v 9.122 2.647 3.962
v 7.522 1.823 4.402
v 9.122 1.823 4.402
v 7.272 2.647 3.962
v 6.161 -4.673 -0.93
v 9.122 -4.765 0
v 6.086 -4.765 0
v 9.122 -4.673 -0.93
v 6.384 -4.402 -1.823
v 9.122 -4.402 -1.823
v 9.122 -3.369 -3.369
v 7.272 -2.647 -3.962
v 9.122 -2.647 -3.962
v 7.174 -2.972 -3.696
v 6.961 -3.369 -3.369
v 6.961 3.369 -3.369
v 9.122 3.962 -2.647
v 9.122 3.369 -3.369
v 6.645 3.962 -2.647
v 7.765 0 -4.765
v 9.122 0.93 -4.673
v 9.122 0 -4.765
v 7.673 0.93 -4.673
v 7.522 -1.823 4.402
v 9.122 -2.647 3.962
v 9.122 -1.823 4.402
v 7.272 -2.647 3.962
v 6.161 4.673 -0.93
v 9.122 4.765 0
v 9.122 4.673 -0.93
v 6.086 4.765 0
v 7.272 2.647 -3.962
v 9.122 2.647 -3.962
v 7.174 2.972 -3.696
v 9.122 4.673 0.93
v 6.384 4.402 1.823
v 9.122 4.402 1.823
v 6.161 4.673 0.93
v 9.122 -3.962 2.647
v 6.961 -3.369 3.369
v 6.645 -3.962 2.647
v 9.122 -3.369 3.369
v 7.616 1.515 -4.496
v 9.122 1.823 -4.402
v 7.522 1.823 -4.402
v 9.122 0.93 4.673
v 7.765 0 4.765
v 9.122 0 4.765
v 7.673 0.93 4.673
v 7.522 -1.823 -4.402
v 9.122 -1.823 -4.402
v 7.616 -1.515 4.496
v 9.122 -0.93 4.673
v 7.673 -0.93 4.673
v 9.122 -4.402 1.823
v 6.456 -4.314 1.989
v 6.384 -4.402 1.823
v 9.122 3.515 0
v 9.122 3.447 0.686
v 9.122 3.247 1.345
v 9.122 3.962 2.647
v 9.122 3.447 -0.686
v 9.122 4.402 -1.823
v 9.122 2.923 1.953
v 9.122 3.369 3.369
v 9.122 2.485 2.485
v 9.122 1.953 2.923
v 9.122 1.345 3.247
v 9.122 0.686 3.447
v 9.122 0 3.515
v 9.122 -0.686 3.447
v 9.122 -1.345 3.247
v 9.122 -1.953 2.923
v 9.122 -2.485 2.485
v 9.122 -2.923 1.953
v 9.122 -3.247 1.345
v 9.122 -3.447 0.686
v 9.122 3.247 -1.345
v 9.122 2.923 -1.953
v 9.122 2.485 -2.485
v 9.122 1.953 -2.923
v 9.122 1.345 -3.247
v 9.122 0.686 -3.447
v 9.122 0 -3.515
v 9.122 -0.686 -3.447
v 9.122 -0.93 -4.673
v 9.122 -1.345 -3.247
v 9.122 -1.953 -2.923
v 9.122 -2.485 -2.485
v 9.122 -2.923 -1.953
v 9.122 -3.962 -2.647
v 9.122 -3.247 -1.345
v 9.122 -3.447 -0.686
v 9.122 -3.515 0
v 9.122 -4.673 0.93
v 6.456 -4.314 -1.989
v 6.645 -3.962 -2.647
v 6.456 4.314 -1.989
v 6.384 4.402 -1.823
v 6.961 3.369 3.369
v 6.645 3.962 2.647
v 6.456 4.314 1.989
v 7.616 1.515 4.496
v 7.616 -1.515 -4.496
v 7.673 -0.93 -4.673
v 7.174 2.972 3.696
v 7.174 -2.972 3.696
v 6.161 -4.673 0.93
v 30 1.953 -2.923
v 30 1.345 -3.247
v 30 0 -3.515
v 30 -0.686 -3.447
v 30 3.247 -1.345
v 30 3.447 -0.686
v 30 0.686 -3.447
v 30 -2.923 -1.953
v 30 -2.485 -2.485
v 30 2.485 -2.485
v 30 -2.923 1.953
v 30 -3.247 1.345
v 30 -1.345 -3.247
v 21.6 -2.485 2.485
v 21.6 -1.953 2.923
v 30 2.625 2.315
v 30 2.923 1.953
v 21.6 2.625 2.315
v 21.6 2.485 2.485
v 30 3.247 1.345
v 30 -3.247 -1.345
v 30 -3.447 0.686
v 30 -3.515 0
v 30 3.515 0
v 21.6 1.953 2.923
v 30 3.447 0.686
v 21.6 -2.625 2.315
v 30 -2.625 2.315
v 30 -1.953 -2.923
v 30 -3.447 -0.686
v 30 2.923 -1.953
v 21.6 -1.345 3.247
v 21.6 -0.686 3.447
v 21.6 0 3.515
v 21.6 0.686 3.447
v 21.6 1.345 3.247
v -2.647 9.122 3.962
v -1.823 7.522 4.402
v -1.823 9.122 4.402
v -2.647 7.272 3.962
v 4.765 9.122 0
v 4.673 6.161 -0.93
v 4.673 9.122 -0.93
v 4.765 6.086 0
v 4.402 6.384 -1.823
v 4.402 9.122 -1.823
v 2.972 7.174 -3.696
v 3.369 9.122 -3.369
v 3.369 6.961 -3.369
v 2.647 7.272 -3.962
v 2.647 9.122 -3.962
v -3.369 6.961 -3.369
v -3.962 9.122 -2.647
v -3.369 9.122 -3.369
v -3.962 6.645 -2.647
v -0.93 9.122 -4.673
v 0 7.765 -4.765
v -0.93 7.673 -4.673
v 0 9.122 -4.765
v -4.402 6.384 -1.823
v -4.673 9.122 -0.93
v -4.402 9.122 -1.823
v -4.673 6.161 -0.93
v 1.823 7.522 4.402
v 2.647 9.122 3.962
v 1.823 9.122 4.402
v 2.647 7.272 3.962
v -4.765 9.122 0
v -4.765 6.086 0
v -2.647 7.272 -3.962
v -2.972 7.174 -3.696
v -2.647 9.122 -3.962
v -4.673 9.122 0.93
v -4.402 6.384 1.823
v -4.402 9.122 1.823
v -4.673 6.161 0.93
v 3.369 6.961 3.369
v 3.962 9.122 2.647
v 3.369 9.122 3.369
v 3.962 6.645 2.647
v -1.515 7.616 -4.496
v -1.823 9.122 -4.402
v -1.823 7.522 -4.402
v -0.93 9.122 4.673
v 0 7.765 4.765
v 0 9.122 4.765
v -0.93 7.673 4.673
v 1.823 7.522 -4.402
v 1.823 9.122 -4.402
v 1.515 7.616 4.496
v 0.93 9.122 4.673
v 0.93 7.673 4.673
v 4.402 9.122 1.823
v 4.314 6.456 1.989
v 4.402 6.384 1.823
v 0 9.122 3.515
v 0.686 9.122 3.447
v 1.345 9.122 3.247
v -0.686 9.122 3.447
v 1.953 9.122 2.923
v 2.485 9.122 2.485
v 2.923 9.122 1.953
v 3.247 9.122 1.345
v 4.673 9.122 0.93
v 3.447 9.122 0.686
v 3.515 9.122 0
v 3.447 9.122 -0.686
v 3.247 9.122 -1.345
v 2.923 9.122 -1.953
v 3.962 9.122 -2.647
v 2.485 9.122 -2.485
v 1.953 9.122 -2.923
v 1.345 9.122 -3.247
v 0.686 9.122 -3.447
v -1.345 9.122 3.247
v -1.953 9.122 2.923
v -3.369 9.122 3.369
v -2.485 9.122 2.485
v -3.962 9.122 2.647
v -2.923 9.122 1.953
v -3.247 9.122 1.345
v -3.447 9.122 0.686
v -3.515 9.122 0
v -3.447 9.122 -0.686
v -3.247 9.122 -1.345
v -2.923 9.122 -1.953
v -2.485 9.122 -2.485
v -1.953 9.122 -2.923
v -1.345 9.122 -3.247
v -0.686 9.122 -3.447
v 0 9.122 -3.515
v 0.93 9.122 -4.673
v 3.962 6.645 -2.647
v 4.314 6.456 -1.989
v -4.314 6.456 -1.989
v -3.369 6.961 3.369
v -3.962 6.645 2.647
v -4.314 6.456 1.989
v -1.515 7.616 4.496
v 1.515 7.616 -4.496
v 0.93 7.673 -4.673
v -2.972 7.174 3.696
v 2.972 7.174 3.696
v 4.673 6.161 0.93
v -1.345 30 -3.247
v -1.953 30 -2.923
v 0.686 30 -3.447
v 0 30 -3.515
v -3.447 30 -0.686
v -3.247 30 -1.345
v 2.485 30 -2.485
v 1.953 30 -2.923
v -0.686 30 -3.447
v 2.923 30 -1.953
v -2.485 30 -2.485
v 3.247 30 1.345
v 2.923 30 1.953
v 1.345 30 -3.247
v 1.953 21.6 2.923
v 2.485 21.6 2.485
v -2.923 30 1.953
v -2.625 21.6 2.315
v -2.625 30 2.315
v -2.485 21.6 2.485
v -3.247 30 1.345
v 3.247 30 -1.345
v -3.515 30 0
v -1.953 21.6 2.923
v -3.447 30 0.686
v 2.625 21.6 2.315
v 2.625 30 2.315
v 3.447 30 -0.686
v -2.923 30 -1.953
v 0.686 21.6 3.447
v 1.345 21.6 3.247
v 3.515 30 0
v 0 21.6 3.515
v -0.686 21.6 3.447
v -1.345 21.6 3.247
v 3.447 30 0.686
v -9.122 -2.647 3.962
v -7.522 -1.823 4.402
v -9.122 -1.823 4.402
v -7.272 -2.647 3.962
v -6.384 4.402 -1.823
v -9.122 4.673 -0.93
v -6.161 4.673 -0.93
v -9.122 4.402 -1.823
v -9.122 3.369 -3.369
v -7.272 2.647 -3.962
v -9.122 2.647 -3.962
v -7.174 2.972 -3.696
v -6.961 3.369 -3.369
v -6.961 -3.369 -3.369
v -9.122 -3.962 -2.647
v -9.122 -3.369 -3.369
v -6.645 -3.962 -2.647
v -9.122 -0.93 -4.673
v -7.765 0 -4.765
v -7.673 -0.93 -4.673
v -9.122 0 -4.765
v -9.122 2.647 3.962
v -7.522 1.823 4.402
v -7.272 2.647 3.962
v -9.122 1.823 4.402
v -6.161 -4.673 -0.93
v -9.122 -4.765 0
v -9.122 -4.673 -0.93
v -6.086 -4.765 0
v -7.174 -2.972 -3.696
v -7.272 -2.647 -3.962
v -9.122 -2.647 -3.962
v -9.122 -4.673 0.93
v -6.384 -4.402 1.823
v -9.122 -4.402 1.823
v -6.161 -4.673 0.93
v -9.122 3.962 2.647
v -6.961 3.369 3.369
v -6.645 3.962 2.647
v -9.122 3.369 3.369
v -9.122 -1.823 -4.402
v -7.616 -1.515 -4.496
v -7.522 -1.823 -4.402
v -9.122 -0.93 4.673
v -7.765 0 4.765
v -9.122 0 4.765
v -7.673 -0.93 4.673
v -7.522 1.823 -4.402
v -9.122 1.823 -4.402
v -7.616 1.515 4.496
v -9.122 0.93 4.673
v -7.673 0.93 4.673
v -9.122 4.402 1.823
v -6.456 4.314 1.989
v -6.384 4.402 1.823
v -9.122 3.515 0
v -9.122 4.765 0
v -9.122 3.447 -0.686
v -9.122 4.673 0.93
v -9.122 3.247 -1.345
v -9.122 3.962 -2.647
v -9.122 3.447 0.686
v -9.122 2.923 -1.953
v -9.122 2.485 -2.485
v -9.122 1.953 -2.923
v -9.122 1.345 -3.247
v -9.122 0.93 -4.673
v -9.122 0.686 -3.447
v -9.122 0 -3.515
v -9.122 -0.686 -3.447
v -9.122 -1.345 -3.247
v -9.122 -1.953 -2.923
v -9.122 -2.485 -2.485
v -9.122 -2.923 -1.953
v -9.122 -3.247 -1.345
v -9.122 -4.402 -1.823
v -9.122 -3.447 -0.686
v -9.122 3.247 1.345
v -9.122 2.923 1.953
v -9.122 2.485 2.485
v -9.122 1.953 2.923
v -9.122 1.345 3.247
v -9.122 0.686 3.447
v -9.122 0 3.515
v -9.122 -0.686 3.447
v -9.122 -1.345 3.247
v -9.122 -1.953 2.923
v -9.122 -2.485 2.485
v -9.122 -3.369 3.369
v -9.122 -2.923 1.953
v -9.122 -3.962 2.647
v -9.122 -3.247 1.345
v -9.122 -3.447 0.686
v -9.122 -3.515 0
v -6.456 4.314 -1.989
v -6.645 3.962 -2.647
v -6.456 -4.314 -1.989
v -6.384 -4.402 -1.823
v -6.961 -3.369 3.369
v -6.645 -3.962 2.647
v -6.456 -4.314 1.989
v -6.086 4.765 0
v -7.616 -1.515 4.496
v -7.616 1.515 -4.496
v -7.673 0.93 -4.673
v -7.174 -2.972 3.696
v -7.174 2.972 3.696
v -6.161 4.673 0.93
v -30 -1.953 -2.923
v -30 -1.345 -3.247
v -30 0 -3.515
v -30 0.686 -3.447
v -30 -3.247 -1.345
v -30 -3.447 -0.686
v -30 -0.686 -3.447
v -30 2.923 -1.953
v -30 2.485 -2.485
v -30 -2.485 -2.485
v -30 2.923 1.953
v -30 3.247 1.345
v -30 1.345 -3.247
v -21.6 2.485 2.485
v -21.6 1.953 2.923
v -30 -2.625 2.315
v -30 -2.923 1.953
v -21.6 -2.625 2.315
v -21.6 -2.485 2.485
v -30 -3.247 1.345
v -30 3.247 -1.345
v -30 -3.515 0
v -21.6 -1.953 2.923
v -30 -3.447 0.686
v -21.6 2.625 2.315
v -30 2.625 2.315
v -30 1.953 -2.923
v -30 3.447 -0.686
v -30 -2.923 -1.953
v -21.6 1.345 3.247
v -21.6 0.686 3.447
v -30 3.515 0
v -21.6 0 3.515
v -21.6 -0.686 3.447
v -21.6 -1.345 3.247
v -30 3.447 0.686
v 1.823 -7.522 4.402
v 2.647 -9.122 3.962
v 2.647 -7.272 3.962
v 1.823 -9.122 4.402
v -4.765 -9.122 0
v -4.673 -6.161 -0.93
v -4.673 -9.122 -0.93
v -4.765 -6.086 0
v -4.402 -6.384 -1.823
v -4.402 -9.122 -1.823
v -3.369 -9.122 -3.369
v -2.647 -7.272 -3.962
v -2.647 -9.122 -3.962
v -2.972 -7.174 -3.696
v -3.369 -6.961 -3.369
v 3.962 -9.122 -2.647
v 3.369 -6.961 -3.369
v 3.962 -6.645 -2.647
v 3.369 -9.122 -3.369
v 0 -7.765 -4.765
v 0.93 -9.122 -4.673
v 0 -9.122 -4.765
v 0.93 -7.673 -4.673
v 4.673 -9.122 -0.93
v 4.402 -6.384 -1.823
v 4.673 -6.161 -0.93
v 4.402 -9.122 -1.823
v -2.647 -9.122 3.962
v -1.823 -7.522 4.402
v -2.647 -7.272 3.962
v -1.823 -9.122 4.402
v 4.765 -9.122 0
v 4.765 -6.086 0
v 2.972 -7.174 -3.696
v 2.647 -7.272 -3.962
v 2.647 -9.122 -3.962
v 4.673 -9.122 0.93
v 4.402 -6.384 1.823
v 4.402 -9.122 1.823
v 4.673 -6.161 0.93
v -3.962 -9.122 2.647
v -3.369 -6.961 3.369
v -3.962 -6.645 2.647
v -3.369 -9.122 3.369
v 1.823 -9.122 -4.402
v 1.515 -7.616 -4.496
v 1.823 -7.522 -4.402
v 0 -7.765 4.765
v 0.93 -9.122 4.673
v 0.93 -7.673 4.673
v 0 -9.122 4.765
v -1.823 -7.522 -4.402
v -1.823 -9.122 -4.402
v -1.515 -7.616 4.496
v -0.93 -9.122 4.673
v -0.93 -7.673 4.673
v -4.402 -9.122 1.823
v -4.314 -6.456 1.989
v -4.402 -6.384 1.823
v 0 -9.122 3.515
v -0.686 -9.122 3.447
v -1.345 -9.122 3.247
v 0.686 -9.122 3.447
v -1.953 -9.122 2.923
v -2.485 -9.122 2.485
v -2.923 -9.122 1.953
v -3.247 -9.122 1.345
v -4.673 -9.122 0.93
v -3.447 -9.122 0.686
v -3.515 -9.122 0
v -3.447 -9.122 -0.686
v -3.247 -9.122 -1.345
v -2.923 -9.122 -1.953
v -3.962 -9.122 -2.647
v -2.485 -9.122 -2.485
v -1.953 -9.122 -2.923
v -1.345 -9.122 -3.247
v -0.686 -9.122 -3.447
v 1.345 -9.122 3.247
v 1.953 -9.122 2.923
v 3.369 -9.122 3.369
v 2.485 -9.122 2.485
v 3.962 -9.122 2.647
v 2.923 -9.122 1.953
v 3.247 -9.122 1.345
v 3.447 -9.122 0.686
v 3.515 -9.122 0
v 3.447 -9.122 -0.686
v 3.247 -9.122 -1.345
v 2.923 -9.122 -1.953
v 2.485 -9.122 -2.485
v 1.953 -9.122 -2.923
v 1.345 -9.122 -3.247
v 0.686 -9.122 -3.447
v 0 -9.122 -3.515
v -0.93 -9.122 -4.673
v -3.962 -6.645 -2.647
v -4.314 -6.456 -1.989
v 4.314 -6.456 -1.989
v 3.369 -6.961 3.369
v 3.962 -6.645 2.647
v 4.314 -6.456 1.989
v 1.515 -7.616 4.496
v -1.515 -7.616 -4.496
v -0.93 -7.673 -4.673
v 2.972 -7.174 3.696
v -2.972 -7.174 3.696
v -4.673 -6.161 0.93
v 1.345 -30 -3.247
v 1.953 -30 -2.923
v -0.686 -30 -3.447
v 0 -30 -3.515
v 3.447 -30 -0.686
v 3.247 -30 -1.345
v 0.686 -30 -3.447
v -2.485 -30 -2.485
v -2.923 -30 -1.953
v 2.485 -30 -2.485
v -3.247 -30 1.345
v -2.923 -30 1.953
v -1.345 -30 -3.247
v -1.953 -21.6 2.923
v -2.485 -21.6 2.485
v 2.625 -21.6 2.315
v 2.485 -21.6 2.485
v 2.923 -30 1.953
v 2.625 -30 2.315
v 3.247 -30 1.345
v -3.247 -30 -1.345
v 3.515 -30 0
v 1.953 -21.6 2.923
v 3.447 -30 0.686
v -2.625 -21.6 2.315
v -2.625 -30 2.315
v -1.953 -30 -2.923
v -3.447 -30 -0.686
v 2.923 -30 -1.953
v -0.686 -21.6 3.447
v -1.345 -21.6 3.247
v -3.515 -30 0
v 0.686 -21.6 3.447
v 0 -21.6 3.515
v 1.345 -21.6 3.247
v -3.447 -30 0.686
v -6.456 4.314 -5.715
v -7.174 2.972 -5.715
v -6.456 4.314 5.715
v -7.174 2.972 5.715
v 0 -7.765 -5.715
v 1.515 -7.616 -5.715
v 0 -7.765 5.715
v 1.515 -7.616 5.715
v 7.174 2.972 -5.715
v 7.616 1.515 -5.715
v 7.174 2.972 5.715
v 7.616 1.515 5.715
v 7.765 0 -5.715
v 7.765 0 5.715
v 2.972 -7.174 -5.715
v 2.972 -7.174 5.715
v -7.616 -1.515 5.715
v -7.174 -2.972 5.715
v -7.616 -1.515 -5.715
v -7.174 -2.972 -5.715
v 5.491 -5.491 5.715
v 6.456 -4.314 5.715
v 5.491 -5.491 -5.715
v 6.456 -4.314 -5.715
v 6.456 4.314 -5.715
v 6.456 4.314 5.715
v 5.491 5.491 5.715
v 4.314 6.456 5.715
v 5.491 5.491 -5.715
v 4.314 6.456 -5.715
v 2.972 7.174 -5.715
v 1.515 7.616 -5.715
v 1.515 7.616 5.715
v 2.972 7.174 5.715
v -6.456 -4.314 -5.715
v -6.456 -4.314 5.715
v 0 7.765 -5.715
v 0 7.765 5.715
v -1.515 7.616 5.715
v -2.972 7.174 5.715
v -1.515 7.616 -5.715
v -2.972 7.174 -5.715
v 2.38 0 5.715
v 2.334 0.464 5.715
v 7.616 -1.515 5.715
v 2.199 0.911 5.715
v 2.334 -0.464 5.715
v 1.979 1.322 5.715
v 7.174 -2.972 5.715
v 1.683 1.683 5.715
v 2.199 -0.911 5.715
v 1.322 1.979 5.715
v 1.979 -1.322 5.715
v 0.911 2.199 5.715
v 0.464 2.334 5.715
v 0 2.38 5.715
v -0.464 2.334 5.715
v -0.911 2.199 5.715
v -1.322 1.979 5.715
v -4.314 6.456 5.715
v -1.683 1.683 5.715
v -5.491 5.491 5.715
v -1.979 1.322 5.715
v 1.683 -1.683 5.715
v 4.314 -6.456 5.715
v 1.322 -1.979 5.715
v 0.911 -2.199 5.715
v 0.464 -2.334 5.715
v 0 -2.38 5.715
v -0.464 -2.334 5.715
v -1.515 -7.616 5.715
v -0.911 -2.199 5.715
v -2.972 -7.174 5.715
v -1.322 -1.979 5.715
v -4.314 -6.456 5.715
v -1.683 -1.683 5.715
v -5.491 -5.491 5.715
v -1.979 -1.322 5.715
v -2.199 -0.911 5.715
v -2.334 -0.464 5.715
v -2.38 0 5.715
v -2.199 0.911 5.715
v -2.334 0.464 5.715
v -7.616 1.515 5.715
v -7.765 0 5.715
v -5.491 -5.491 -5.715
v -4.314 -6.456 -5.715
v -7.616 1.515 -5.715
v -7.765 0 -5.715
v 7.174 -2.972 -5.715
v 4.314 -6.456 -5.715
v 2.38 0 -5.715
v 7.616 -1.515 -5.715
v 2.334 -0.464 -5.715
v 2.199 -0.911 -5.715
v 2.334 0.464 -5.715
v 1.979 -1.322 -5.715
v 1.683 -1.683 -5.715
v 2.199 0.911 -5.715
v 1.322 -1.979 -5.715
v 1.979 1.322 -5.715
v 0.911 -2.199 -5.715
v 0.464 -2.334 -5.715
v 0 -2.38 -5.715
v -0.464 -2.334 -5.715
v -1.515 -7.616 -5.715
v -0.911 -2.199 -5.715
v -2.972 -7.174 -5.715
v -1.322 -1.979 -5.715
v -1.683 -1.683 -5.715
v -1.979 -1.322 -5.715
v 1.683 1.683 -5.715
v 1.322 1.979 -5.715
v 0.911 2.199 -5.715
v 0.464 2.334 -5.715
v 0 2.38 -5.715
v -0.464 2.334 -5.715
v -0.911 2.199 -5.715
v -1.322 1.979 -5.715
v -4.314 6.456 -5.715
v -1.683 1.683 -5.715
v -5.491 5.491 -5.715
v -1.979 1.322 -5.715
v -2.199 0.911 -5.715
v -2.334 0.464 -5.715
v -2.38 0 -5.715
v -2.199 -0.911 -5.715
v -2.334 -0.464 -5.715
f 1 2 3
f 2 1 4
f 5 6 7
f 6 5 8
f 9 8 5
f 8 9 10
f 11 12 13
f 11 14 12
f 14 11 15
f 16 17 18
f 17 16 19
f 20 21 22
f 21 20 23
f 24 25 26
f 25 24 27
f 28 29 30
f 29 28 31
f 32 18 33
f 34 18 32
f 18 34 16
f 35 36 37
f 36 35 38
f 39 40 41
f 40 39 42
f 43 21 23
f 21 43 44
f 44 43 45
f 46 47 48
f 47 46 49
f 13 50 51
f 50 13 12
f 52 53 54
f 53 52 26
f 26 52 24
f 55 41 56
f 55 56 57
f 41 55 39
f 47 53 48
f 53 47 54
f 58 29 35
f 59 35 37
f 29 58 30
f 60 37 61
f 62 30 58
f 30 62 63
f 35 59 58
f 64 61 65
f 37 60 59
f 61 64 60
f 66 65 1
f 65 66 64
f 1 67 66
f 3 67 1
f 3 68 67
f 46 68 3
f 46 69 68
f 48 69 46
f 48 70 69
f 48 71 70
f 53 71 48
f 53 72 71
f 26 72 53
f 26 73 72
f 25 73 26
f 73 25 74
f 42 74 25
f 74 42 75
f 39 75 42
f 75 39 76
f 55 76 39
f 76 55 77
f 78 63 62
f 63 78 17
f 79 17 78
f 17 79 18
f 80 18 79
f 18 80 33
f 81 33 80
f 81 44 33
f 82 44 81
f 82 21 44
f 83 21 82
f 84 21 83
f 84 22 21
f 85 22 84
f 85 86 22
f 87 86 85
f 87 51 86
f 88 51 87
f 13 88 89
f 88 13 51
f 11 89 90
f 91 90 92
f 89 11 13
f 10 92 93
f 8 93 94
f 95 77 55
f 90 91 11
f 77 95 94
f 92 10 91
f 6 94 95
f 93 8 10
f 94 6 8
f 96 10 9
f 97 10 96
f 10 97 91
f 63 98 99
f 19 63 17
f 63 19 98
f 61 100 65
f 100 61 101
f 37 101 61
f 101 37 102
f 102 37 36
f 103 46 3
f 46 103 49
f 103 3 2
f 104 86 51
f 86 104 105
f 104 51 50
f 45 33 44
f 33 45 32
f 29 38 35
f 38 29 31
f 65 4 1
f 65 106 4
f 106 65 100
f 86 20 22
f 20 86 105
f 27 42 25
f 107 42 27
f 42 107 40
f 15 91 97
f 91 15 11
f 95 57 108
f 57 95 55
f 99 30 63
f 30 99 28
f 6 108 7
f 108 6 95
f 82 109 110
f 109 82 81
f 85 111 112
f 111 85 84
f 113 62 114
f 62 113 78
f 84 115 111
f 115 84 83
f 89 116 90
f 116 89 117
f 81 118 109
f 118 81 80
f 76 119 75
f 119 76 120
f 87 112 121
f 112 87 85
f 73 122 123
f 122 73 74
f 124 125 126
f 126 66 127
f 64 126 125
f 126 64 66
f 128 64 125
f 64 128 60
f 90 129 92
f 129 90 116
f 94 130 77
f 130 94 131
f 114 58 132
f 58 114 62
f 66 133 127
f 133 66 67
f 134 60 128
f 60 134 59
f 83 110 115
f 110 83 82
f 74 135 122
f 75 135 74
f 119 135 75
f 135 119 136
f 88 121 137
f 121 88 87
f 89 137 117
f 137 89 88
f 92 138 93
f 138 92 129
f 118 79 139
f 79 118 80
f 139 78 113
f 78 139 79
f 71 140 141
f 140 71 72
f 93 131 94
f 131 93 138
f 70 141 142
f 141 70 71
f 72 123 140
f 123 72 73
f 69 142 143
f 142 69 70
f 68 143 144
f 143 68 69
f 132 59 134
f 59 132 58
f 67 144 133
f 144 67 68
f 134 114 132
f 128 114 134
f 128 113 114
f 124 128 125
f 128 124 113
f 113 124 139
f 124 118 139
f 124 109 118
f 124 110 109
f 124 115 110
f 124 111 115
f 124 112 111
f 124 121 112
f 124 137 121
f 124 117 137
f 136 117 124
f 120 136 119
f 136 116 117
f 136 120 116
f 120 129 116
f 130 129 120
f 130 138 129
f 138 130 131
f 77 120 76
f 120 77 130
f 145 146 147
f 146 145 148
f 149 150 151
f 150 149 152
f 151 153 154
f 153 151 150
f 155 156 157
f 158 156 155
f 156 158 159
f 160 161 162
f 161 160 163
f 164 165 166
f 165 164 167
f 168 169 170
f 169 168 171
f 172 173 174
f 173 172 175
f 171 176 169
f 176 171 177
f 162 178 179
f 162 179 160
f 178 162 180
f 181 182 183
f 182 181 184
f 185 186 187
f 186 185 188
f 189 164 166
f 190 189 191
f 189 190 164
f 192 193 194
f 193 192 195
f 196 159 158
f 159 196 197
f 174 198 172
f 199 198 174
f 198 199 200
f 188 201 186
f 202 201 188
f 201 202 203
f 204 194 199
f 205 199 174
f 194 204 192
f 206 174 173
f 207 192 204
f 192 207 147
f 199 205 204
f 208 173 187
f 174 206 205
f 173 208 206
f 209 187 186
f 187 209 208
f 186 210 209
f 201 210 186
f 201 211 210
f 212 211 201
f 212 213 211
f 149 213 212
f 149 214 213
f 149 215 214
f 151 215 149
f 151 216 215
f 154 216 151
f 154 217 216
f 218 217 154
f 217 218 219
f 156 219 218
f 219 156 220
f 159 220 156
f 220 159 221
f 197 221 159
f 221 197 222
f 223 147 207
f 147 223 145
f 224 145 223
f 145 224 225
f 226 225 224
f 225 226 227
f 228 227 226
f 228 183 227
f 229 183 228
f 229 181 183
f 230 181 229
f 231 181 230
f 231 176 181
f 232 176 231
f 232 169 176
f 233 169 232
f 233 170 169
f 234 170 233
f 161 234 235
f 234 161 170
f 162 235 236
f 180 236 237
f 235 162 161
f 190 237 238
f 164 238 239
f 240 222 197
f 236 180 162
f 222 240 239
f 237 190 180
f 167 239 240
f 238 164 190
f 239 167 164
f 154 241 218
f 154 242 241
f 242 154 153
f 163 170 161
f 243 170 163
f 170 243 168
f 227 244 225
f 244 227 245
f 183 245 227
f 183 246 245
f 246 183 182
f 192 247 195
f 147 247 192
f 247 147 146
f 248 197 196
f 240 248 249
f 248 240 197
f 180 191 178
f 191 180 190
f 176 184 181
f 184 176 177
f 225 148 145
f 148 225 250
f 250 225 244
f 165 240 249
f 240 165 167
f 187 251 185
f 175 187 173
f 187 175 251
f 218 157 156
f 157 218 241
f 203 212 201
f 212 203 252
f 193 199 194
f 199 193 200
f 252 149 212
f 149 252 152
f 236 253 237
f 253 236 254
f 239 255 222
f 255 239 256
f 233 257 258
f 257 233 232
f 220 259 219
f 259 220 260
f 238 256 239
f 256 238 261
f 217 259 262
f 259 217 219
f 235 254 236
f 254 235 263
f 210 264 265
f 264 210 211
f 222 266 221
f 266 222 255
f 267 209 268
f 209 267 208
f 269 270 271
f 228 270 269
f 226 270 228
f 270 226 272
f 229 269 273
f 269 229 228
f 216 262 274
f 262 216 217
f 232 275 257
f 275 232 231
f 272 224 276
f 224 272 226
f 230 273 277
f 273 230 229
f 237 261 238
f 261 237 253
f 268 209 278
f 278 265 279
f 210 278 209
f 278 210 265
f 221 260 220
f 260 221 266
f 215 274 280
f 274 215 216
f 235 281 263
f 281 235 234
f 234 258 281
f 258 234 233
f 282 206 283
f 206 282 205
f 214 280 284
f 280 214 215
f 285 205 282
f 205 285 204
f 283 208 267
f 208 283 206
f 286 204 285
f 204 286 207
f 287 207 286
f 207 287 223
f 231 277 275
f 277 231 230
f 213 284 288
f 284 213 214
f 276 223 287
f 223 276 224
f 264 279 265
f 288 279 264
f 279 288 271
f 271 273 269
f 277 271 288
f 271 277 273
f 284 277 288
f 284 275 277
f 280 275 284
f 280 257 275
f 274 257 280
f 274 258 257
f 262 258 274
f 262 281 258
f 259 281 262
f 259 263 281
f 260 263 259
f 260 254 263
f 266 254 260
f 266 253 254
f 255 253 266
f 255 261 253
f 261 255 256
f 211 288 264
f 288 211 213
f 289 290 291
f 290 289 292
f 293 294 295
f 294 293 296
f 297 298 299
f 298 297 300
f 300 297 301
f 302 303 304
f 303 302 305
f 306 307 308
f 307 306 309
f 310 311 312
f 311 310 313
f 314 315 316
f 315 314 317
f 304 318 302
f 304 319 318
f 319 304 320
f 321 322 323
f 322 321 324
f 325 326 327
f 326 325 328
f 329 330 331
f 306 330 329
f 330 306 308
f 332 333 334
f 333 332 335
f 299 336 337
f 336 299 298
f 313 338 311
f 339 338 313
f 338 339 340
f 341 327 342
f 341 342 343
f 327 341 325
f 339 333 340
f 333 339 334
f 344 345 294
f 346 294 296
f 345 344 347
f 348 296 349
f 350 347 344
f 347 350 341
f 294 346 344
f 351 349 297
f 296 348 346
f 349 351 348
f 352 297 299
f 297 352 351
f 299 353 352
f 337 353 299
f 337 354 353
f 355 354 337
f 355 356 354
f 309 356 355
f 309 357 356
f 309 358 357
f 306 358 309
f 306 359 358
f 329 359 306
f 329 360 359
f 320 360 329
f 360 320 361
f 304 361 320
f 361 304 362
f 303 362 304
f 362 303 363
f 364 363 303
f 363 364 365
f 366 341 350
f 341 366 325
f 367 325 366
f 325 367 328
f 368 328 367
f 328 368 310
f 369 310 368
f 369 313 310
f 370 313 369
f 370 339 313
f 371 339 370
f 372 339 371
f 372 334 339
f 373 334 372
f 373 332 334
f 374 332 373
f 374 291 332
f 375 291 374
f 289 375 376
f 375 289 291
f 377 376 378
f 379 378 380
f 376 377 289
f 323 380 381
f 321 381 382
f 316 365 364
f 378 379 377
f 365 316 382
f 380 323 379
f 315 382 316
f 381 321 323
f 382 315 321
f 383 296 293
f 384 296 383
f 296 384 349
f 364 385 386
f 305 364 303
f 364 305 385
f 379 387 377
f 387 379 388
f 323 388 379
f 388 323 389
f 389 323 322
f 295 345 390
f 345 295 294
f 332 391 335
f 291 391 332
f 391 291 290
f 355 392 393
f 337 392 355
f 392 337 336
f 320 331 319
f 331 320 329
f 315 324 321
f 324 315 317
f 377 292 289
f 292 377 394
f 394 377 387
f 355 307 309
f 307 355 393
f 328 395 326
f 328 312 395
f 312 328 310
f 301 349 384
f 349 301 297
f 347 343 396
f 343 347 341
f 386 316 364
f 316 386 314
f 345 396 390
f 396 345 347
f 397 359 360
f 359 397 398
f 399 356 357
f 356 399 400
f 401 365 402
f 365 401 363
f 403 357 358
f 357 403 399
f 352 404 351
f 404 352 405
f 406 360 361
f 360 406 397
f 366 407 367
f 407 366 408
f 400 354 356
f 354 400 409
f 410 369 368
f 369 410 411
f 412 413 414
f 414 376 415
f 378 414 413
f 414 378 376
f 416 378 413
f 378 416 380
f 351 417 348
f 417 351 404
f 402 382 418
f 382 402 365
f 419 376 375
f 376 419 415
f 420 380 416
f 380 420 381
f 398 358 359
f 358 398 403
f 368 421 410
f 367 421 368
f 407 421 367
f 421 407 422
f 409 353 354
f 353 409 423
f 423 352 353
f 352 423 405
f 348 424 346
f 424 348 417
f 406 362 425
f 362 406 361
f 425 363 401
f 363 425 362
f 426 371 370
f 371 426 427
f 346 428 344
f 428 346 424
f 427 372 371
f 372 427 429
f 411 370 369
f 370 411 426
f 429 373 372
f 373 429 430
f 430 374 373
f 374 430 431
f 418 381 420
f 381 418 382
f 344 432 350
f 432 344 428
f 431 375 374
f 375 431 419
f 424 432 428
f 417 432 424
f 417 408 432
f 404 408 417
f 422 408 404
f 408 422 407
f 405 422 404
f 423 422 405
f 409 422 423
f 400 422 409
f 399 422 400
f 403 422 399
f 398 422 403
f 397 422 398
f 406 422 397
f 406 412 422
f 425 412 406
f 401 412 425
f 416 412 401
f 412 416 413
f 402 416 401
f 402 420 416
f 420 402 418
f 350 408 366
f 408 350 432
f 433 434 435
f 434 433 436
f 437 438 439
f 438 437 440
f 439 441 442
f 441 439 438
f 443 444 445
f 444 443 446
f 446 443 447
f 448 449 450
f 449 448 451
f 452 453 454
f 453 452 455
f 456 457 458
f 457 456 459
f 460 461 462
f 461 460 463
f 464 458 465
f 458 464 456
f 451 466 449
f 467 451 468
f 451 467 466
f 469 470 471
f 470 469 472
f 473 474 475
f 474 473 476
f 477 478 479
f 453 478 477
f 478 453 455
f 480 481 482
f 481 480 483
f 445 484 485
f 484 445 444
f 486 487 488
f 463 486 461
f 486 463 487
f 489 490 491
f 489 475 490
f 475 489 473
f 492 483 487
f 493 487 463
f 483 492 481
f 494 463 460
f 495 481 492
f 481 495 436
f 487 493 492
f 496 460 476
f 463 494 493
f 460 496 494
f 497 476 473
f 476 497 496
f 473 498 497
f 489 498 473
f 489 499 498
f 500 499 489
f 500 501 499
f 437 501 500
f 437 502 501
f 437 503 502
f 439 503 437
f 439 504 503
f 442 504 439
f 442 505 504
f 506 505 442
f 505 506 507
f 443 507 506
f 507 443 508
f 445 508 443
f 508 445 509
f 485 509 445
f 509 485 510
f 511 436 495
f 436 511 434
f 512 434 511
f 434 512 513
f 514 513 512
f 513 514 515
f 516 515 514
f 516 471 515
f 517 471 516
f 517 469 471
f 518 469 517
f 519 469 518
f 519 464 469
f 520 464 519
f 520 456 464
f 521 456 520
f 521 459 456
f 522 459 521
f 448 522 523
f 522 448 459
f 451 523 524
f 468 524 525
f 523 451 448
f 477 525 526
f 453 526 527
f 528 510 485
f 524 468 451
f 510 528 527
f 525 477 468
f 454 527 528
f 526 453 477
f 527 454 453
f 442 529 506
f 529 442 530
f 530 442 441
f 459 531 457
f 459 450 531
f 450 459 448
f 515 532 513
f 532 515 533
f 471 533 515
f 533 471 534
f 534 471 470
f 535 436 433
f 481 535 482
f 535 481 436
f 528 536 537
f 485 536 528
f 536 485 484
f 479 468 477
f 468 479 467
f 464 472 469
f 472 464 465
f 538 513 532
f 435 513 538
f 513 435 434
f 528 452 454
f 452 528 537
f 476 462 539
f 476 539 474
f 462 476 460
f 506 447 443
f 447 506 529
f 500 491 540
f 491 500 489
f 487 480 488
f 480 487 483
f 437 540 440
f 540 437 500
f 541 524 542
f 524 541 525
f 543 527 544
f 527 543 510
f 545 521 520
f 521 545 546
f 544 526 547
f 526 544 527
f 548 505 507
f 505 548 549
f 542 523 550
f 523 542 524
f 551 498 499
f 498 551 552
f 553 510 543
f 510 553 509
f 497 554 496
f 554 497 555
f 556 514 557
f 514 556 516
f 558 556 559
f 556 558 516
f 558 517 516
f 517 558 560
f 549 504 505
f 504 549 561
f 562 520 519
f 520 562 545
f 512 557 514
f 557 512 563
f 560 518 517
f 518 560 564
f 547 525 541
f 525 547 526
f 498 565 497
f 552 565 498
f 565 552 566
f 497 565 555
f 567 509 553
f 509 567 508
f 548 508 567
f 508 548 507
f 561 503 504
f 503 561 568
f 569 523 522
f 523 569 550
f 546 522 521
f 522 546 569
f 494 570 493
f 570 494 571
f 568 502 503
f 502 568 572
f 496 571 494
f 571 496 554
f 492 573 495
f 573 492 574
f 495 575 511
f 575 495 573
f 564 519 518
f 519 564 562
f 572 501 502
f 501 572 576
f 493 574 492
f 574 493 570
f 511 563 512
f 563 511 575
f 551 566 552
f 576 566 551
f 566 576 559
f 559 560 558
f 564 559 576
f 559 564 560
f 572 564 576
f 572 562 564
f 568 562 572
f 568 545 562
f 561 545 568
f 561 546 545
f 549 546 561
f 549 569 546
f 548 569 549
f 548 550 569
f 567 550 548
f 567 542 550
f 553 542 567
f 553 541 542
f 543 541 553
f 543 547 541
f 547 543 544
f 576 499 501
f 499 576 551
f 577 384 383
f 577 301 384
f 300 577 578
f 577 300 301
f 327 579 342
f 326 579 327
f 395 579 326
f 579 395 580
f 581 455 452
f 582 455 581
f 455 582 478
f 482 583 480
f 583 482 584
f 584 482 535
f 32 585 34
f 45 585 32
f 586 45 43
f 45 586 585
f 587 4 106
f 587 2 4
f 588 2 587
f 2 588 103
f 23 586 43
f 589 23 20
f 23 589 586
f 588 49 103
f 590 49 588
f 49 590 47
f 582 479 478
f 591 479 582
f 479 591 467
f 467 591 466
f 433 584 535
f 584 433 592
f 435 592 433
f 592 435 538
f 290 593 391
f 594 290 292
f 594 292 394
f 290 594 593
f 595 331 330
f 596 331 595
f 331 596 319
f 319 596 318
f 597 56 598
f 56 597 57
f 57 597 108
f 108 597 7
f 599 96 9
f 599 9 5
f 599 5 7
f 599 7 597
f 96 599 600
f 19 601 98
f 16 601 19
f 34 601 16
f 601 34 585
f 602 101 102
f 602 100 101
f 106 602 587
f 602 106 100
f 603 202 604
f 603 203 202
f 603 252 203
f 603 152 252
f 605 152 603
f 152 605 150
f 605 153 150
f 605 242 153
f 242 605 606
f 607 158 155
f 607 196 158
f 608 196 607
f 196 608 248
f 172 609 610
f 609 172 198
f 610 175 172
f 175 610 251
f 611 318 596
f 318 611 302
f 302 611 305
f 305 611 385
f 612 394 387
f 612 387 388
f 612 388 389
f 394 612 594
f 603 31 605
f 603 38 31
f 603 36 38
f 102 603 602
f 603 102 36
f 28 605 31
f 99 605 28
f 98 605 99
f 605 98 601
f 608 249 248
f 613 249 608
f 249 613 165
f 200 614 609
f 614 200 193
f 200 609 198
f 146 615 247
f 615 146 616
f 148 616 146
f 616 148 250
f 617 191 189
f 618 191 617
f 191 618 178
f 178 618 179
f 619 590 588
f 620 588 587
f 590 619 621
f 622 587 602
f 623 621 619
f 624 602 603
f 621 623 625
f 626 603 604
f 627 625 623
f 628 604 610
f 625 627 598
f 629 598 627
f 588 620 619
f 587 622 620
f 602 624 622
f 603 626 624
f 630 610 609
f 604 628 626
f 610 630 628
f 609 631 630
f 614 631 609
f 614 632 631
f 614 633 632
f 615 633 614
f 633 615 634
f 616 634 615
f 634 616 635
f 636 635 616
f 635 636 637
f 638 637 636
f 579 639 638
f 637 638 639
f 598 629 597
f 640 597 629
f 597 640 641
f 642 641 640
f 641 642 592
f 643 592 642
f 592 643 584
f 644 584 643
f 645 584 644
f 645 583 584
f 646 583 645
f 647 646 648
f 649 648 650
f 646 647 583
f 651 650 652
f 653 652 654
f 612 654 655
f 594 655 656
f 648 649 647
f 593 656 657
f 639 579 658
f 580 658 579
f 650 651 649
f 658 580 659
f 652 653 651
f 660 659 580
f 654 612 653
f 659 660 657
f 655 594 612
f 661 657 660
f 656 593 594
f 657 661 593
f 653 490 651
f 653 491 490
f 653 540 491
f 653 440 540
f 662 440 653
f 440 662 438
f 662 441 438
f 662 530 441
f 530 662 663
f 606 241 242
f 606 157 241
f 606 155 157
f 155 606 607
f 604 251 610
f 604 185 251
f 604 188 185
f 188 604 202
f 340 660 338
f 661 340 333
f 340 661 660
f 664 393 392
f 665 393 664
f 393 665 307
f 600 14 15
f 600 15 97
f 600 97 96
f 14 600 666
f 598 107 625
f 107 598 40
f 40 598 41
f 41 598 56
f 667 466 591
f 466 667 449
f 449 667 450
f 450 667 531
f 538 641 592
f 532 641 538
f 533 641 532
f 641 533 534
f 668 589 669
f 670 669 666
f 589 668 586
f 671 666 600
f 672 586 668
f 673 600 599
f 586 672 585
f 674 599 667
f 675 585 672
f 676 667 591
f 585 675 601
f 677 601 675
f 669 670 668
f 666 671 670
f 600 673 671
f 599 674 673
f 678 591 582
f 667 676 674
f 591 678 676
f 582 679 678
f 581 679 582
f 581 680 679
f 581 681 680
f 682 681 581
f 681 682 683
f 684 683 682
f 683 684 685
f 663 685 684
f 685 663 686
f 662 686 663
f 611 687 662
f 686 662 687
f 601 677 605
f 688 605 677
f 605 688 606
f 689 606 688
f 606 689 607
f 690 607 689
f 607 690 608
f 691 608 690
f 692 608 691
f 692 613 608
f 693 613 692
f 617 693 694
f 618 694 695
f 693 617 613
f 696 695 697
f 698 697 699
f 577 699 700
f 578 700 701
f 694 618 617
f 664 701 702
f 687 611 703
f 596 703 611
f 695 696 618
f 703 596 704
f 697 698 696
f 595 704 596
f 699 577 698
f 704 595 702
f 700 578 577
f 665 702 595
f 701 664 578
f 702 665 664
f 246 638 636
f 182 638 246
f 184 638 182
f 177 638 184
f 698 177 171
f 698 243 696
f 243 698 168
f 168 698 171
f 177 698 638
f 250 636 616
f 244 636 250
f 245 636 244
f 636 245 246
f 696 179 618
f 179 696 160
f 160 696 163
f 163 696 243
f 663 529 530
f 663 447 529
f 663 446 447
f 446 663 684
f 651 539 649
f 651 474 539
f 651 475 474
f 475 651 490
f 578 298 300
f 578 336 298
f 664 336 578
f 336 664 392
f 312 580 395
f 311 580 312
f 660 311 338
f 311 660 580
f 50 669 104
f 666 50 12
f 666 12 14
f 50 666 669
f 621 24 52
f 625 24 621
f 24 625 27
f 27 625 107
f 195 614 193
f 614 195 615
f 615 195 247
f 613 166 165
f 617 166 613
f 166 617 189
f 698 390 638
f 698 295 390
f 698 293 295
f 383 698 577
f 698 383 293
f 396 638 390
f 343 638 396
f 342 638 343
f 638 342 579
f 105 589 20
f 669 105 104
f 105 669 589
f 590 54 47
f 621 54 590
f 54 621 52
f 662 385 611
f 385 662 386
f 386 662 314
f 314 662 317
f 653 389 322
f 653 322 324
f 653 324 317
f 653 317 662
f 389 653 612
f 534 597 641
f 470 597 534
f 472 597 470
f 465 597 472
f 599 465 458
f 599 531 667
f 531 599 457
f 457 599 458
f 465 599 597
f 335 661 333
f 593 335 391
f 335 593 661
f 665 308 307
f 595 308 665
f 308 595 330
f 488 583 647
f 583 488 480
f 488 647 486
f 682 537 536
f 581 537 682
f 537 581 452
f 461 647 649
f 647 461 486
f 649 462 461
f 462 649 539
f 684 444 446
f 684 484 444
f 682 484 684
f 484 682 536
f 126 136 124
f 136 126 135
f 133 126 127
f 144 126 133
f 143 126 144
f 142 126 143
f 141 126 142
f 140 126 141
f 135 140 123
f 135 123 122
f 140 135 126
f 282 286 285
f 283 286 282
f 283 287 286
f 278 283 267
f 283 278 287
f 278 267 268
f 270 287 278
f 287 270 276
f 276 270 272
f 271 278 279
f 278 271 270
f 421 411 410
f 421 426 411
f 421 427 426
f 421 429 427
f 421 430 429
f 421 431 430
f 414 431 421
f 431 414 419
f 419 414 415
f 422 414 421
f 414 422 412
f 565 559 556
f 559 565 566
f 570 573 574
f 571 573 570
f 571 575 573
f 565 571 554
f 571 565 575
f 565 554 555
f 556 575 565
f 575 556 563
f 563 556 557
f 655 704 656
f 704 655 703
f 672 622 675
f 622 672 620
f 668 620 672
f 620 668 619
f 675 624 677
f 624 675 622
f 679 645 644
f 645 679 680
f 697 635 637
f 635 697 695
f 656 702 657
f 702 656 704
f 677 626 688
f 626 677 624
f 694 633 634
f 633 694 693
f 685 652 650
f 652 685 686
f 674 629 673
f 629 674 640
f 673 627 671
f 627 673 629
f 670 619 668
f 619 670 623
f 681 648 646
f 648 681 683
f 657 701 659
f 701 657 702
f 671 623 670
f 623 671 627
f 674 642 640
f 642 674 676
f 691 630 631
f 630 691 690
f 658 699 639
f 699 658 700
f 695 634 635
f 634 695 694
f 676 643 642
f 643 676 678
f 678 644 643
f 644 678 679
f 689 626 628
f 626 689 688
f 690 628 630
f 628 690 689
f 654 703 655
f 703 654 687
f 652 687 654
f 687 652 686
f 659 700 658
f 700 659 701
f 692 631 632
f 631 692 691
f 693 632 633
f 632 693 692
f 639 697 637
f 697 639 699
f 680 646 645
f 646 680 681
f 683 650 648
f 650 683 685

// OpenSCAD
$fn = 32;

// ----------------------------------------------------------------------
// Cardan cross: 60 mm span, 9.53 mm trunnions
// ----------------------------------------------------------------------

// --- parameters (mm) ---
journal_d = 9.53;         // trunnion diameter
arm_len = 30;             // trunnion length from the centre
step_r = 3.24;            // step position from the centre
step_d = 7.03;            // journal diameter after the step
hub_d = 15.53;            // hub diameter
hub_h = 11.43;            // hub height
bore_d = 4.76;            // hub bore
flat_d = 1.2;             // depth of the journal flat
flat_len = 8.4;           // length of the journal flat

difference() {
  union() {
    /* hub along the joint axis */
    cylinder(h = hub_h, d = hub_d, center = true);
    for (a = [0 : 90 : 270]) rotate([0, 0, a]) {
      /* trunnion, sunk into the hub */
      translate([hub_d / 4, 0, 0]) rotate([0, 90, 0]) cylinder(h = step_r + 2, d = journal_d);
      /* stepped journal out to the tip */
      translate([step_r - 0.5, 0, 0]) rotate([0, 90, 0]) cylinder(h = arm_len + 0.5 - step_r, d = step_d);
    }
  }
  /* lubrication bore through the hub, 2.5 mm clear on both sides */
  translate([0, 0, -hub_h / 2 - 2.5]) cylinder(h = hub_h + 5, d = bore_d);
  /* machined flat on each journal tip */
  for (a = [0 : 90 : 270]) rotate([0, 0, a]) {
    translate([arm_len - flat_len, -step_d, step_d / 2 - flat_d]) cube([flat_len + 0.5, 2 * step_d, flat_d + 2.5]);
  }
}
